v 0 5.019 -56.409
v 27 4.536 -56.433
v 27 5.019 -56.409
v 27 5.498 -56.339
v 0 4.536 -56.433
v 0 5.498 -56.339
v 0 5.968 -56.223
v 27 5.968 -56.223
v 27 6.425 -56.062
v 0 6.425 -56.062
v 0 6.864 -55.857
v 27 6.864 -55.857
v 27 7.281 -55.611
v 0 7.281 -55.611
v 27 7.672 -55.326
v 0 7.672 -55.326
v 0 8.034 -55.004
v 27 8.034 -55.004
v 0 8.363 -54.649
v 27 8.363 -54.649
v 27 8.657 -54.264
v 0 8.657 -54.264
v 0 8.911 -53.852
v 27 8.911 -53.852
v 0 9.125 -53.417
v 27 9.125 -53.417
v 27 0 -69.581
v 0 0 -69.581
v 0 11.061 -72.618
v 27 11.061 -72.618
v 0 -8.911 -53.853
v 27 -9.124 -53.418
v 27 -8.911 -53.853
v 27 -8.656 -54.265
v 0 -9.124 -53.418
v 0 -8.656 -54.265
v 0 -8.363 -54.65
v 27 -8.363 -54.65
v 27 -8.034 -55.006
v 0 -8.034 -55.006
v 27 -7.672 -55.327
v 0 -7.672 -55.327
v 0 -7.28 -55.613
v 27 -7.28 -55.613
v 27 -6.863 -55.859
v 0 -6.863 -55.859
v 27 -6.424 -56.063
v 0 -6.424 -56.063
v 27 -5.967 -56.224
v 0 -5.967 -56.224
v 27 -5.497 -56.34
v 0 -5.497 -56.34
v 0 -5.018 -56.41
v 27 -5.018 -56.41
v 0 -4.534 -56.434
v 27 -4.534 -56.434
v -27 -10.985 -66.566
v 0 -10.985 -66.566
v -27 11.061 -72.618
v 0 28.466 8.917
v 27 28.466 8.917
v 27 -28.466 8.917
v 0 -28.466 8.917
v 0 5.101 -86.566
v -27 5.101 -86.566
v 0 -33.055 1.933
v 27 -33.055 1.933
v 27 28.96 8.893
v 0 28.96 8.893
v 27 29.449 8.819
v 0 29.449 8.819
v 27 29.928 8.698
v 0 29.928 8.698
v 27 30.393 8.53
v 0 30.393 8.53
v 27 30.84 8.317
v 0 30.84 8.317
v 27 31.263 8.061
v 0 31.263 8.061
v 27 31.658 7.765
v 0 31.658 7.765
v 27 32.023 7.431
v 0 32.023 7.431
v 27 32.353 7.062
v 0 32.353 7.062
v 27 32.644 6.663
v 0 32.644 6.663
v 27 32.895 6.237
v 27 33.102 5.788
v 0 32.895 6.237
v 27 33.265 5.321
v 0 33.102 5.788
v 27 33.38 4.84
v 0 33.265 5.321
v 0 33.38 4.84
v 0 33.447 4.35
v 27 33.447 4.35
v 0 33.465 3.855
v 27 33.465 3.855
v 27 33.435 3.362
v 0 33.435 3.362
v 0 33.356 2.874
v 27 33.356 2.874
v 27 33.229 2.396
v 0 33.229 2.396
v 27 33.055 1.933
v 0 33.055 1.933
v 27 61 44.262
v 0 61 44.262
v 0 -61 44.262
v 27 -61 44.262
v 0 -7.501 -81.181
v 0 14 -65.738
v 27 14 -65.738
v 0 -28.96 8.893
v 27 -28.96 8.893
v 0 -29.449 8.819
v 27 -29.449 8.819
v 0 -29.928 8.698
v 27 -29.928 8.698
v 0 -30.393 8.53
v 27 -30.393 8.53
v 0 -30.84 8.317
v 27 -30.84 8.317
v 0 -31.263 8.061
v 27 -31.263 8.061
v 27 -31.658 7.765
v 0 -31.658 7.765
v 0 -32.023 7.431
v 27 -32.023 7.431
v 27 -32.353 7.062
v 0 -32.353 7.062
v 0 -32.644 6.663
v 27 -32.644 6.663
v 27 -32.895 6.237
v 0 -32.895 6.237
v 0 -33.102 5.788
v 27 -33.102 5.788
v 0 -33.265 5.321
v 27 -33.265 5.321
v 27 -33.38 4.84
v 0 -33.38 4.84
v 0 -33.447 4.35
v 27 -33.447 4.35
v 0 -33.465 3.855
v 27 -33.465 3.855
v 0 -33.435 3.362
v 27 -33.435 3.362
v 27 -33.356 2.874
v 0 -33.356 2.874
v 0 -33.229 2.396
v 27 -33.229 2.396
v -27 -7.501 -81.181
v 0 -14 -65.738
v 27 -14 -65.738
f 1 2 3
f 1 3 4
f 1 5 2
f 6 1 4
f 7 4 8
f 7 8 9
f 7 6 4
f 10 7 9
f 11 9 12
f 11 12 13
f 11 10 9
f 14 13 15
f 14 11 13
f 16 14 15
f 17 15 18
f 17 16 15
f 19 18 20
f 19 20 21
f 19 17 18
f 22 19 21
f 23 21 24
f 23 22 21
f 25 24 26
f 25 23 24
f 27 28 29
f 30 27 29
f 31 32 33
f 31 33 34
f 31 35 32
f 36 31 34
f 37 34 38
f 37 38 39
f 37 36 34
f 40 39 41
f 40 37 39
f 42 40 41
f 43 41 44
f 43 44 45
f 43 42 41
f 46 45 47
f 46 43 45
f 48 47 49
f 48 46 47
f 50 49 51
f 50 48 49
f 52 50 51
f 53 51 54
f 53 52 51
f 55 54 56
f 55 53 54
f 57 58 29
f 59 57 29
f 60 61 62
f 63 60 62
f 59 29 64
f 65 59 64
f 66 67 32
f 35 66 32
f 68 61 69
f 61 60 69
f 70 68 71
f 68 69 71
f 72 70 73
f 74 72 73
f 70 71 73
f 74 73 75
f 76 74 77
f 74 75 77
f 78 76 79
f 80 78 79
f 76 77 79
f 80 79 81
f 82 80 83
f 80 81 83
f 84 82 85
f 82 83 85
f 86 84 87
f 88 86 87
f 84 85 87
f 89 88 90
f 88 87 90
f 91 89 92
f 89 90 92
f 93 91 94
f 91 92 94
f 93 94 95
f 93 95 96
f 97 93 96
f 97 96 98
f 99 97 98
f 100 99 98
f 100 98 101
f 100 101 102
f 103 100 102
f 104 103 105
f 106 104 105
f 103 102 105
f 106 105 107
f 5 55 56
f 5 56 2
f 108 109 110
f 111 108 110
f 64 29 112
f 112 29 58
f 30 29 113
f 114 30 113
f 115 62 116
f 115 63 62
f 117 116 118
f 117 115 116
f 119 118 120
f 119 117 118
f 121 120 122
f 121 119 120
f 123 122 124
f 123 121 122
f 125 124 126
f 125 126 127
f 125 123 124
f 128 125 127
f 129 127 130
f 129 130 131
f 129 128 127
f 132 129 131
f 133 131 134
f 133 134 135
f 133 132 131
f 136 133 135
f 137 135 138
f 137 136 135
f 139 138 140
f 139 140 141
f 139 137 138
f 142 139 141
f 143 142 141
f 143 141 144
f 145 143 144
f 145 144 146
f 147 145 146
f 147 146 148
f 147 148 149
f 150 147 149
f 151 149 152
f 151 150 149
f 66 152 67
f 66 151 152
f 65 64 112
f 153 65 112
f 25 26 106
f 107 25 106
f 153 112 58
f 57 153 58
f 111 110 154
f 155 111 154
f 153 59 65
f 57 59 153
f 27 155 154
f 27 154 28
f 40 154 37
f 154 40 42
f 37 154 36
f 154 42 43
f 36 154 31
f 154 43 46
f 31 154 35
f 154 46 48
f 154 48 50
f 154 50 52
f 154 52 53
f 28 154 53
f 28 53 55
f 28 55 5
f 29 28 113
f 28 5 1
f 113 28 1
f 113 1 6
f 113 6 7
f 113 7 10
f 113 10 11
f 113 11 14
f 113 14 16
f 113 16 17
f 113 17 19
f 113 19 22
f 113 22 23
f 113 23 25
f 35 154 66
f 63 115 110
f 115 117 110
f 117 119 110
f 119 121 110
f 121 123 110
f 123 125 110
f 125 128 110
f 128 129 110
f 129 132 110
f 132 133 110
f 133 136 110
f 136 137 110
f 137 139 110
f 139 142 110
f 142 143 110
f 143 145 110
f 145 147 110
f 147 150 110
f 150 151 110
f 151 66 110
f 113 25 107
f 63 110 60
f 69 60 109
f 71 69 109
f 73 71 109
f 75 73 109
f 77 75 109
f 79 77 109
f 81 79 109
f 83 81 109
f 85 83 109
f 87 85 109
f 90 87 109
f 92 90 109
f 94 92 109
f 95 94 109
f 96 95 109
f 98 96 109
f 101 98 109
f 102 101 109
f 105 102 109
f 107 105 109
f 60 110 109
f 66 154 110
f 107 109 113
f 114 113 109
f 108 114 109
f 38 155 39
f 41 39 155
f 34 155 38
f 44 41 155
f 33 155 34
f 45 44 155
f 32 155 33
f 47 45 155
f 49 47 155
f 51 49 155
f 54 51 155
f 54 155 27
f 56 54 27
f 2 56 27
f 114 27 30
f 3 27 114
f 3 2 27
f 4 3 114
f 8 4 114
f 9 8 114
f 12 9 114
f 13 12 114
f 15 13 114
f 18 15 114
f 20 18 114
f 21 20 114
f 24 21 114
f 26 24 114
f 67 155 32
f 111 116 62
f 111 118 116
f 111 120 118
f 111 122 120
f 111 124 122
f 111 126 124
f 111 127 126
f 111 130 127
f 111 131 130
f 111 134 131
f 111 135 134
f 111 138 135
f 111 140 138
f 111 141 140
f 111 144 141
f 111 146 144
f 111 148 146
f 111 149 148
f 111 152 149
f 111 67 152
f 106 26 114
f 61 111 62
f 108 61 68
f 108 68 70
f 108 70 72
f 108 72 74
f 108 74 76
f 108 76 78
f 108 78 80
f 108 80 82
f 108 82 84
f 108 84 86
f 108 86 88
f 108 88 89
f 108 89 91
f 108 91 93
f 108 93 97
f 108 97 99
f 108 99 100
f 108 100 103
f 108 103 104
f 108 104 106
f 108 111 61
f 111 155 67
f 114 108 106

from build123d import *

# Parameters (mm, degrees)
F1_DEPTH = 27
F3_DEPTH = 30
F4_R     = 5
F6_DEPTH = 27


with BuildPart() as f1:
    # F0 (on Right) → F1 (new body)
    with BuildSketch(Plane.YZ):
        Polygon((0, -65.738282), (0, 44.261718), (-61, 44.261718), (-14, -65.738282), align=None)
        Polygon((61, 44.261718), (0, 44.261718), (0, -65.738282), (14, -65.738282), align=None)
        Polygon((14, -65.738282), (0, -65.738282), (0, -69.581399), (11.060639, -72.617638), align=None)
        Polygon((0, -69.581399), (0, -65.738282), (-14, -65.738282), align=None)
    extrude(amount=F1_DEPTH)

    # F2 (on face) → F3 (cut)
    with BuildSketch(Plane.YZ.offset(27)):
        Polygon((36.07466, 8.916986), (-36.07466, 8.916986), (-7.820144, -56.434208), (7.820817, -56.432634), align=None)
    extrude(amount=-F3_DEPTH, mode=Mode.SUBTRACT)

    # F4
    f4_edges = [f1.edges().sort_by_distance(p)[0] for p in [
        (13.5, -36.07466, 8.916986),
        (13.5, 36.07466, 8.916986),
        (13.5, -7.820144, -56.434208),
        (13.5, 7.820817, -56.432634),
    ]]
    fillet(f4_edges, radius=F4_R)


with BuildPart() as f6:
    # F5 (on face) → F6 (new body)
    with BuildSketch(Plane(origin=(0, 0, 0), x_dir=(0, -1, 0), z_dir=(-1, 0, 0))):
        Polygon((10.984566, -66.566044), (-11.060639, -72.617638), (-5.10103, -86.565657), (7.501293, -81.181028), align=None)
    extrude(amount=F6_DEPTH)


solid = Compound([f1.part, f6.part])
